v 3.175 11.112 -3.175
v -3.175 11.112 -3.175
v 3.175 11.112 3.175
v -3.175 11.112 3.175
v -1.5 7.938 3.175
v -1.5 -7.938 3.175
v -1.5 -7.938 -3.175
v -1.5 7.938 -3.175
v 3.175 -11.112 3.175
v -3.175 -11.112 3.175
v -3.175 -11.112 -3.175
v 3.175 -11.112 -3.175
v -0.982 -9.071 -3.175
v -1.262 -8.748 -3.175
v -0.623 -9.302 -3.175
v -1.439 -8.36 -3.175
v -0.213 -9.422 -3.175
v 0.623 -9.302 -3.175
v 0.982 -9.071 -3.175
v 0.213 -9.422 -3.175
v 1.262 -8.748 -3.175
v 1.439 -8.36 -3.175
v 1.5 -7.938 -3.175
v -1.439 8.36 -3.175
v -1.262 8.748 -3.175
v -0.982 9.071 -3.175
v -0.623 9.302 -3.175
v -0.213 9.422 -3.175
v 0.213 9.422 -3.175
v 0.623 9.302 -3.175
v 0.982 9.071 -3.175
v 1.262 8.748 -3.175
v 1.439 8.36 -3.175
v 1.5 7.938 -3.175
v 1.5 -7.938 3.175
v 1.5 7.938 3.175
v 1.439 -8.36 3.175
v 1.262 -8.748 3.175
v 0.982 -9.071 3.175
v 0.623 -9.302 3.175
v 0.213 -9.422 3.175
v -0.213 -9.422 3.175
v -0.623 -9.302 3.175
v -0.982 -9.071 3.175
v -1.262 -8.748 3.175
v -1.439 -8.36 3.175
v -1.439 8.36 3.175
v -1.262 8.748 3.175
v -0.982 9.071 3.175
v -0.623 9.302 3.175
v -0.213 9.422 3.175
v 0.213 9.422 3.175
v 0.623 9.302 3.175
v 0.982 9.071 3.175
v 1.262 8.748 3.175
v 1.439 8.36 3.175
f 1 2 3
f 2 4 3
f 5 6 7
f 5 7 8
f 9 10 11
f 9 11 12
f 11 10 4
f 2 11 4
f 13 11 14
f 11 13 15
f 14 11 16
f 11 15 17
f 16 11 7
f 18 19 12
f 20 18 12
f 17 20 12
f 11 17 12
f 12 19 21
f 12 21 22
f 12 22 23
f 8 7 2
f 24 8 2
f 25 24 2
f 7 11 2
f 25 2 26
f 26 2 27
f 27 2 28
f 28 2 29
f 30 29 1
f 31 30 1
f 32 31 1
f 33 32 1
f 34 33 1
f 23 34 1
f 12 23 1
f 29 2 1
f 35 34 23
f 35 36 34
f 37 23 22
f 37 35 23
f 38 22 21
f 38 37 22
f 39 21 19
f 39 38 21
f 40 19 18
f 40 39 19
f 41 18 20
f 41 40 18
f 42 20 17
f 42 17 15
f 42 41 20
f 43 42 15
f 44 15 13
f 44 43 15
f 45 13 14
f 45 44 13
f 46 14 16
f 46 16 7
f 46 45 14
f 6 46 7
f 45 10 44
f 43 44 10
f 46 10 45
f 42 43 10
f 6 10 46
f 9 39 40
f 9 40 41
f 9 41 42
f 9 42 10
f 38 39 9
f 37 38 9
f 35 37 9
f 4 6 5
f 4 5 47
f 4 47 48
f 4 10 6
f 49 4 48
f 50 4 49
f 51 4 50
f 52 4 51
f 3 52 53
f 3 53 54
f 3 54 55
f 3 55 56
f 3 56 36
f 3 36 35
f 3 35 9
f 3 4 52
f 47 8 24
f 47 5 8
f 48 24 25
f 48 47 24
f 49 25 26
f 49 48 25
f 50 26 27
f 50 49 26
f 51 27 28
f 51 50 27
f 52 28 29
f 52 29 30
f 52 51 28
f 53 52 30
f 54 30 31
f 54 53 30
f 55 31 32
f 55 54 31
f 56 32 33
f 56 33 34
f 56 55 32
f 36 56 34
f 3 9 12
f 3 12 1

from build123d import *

# Parameters (mm, degrees)
SKETCH1_W           = 6.35
SKETCH1_H           = 22.225
BOSS_EXTRUDE1_DEPTH = 3.175


with BuildPart() as part:
    # Sketch1 → Boss-Extrude1 (new, symmetric)
    with BuildSketch(Plane.XY):
        Rectangle(SKETCH1_W, SKETCH1_H)
        with BuildLine():
            Line((-1.5, -7.9375), (-1.5, 7.9375))
            ThreePointArc((-1.5, 7.9375), (0, 9.4375), (1.5, 7.9375))
            Line((1.5, 7.9375), (1.5, -7.9375))
            ThreePointArc((1.5, -7.9375), (0, -9.4375), (-1.5, -7.9375))
        make_face(mode=Mode.SUBTRACT)
    extrude(amount=BOSS_EXTRUDE1_DEPTH, both=True)


solid = part.part
